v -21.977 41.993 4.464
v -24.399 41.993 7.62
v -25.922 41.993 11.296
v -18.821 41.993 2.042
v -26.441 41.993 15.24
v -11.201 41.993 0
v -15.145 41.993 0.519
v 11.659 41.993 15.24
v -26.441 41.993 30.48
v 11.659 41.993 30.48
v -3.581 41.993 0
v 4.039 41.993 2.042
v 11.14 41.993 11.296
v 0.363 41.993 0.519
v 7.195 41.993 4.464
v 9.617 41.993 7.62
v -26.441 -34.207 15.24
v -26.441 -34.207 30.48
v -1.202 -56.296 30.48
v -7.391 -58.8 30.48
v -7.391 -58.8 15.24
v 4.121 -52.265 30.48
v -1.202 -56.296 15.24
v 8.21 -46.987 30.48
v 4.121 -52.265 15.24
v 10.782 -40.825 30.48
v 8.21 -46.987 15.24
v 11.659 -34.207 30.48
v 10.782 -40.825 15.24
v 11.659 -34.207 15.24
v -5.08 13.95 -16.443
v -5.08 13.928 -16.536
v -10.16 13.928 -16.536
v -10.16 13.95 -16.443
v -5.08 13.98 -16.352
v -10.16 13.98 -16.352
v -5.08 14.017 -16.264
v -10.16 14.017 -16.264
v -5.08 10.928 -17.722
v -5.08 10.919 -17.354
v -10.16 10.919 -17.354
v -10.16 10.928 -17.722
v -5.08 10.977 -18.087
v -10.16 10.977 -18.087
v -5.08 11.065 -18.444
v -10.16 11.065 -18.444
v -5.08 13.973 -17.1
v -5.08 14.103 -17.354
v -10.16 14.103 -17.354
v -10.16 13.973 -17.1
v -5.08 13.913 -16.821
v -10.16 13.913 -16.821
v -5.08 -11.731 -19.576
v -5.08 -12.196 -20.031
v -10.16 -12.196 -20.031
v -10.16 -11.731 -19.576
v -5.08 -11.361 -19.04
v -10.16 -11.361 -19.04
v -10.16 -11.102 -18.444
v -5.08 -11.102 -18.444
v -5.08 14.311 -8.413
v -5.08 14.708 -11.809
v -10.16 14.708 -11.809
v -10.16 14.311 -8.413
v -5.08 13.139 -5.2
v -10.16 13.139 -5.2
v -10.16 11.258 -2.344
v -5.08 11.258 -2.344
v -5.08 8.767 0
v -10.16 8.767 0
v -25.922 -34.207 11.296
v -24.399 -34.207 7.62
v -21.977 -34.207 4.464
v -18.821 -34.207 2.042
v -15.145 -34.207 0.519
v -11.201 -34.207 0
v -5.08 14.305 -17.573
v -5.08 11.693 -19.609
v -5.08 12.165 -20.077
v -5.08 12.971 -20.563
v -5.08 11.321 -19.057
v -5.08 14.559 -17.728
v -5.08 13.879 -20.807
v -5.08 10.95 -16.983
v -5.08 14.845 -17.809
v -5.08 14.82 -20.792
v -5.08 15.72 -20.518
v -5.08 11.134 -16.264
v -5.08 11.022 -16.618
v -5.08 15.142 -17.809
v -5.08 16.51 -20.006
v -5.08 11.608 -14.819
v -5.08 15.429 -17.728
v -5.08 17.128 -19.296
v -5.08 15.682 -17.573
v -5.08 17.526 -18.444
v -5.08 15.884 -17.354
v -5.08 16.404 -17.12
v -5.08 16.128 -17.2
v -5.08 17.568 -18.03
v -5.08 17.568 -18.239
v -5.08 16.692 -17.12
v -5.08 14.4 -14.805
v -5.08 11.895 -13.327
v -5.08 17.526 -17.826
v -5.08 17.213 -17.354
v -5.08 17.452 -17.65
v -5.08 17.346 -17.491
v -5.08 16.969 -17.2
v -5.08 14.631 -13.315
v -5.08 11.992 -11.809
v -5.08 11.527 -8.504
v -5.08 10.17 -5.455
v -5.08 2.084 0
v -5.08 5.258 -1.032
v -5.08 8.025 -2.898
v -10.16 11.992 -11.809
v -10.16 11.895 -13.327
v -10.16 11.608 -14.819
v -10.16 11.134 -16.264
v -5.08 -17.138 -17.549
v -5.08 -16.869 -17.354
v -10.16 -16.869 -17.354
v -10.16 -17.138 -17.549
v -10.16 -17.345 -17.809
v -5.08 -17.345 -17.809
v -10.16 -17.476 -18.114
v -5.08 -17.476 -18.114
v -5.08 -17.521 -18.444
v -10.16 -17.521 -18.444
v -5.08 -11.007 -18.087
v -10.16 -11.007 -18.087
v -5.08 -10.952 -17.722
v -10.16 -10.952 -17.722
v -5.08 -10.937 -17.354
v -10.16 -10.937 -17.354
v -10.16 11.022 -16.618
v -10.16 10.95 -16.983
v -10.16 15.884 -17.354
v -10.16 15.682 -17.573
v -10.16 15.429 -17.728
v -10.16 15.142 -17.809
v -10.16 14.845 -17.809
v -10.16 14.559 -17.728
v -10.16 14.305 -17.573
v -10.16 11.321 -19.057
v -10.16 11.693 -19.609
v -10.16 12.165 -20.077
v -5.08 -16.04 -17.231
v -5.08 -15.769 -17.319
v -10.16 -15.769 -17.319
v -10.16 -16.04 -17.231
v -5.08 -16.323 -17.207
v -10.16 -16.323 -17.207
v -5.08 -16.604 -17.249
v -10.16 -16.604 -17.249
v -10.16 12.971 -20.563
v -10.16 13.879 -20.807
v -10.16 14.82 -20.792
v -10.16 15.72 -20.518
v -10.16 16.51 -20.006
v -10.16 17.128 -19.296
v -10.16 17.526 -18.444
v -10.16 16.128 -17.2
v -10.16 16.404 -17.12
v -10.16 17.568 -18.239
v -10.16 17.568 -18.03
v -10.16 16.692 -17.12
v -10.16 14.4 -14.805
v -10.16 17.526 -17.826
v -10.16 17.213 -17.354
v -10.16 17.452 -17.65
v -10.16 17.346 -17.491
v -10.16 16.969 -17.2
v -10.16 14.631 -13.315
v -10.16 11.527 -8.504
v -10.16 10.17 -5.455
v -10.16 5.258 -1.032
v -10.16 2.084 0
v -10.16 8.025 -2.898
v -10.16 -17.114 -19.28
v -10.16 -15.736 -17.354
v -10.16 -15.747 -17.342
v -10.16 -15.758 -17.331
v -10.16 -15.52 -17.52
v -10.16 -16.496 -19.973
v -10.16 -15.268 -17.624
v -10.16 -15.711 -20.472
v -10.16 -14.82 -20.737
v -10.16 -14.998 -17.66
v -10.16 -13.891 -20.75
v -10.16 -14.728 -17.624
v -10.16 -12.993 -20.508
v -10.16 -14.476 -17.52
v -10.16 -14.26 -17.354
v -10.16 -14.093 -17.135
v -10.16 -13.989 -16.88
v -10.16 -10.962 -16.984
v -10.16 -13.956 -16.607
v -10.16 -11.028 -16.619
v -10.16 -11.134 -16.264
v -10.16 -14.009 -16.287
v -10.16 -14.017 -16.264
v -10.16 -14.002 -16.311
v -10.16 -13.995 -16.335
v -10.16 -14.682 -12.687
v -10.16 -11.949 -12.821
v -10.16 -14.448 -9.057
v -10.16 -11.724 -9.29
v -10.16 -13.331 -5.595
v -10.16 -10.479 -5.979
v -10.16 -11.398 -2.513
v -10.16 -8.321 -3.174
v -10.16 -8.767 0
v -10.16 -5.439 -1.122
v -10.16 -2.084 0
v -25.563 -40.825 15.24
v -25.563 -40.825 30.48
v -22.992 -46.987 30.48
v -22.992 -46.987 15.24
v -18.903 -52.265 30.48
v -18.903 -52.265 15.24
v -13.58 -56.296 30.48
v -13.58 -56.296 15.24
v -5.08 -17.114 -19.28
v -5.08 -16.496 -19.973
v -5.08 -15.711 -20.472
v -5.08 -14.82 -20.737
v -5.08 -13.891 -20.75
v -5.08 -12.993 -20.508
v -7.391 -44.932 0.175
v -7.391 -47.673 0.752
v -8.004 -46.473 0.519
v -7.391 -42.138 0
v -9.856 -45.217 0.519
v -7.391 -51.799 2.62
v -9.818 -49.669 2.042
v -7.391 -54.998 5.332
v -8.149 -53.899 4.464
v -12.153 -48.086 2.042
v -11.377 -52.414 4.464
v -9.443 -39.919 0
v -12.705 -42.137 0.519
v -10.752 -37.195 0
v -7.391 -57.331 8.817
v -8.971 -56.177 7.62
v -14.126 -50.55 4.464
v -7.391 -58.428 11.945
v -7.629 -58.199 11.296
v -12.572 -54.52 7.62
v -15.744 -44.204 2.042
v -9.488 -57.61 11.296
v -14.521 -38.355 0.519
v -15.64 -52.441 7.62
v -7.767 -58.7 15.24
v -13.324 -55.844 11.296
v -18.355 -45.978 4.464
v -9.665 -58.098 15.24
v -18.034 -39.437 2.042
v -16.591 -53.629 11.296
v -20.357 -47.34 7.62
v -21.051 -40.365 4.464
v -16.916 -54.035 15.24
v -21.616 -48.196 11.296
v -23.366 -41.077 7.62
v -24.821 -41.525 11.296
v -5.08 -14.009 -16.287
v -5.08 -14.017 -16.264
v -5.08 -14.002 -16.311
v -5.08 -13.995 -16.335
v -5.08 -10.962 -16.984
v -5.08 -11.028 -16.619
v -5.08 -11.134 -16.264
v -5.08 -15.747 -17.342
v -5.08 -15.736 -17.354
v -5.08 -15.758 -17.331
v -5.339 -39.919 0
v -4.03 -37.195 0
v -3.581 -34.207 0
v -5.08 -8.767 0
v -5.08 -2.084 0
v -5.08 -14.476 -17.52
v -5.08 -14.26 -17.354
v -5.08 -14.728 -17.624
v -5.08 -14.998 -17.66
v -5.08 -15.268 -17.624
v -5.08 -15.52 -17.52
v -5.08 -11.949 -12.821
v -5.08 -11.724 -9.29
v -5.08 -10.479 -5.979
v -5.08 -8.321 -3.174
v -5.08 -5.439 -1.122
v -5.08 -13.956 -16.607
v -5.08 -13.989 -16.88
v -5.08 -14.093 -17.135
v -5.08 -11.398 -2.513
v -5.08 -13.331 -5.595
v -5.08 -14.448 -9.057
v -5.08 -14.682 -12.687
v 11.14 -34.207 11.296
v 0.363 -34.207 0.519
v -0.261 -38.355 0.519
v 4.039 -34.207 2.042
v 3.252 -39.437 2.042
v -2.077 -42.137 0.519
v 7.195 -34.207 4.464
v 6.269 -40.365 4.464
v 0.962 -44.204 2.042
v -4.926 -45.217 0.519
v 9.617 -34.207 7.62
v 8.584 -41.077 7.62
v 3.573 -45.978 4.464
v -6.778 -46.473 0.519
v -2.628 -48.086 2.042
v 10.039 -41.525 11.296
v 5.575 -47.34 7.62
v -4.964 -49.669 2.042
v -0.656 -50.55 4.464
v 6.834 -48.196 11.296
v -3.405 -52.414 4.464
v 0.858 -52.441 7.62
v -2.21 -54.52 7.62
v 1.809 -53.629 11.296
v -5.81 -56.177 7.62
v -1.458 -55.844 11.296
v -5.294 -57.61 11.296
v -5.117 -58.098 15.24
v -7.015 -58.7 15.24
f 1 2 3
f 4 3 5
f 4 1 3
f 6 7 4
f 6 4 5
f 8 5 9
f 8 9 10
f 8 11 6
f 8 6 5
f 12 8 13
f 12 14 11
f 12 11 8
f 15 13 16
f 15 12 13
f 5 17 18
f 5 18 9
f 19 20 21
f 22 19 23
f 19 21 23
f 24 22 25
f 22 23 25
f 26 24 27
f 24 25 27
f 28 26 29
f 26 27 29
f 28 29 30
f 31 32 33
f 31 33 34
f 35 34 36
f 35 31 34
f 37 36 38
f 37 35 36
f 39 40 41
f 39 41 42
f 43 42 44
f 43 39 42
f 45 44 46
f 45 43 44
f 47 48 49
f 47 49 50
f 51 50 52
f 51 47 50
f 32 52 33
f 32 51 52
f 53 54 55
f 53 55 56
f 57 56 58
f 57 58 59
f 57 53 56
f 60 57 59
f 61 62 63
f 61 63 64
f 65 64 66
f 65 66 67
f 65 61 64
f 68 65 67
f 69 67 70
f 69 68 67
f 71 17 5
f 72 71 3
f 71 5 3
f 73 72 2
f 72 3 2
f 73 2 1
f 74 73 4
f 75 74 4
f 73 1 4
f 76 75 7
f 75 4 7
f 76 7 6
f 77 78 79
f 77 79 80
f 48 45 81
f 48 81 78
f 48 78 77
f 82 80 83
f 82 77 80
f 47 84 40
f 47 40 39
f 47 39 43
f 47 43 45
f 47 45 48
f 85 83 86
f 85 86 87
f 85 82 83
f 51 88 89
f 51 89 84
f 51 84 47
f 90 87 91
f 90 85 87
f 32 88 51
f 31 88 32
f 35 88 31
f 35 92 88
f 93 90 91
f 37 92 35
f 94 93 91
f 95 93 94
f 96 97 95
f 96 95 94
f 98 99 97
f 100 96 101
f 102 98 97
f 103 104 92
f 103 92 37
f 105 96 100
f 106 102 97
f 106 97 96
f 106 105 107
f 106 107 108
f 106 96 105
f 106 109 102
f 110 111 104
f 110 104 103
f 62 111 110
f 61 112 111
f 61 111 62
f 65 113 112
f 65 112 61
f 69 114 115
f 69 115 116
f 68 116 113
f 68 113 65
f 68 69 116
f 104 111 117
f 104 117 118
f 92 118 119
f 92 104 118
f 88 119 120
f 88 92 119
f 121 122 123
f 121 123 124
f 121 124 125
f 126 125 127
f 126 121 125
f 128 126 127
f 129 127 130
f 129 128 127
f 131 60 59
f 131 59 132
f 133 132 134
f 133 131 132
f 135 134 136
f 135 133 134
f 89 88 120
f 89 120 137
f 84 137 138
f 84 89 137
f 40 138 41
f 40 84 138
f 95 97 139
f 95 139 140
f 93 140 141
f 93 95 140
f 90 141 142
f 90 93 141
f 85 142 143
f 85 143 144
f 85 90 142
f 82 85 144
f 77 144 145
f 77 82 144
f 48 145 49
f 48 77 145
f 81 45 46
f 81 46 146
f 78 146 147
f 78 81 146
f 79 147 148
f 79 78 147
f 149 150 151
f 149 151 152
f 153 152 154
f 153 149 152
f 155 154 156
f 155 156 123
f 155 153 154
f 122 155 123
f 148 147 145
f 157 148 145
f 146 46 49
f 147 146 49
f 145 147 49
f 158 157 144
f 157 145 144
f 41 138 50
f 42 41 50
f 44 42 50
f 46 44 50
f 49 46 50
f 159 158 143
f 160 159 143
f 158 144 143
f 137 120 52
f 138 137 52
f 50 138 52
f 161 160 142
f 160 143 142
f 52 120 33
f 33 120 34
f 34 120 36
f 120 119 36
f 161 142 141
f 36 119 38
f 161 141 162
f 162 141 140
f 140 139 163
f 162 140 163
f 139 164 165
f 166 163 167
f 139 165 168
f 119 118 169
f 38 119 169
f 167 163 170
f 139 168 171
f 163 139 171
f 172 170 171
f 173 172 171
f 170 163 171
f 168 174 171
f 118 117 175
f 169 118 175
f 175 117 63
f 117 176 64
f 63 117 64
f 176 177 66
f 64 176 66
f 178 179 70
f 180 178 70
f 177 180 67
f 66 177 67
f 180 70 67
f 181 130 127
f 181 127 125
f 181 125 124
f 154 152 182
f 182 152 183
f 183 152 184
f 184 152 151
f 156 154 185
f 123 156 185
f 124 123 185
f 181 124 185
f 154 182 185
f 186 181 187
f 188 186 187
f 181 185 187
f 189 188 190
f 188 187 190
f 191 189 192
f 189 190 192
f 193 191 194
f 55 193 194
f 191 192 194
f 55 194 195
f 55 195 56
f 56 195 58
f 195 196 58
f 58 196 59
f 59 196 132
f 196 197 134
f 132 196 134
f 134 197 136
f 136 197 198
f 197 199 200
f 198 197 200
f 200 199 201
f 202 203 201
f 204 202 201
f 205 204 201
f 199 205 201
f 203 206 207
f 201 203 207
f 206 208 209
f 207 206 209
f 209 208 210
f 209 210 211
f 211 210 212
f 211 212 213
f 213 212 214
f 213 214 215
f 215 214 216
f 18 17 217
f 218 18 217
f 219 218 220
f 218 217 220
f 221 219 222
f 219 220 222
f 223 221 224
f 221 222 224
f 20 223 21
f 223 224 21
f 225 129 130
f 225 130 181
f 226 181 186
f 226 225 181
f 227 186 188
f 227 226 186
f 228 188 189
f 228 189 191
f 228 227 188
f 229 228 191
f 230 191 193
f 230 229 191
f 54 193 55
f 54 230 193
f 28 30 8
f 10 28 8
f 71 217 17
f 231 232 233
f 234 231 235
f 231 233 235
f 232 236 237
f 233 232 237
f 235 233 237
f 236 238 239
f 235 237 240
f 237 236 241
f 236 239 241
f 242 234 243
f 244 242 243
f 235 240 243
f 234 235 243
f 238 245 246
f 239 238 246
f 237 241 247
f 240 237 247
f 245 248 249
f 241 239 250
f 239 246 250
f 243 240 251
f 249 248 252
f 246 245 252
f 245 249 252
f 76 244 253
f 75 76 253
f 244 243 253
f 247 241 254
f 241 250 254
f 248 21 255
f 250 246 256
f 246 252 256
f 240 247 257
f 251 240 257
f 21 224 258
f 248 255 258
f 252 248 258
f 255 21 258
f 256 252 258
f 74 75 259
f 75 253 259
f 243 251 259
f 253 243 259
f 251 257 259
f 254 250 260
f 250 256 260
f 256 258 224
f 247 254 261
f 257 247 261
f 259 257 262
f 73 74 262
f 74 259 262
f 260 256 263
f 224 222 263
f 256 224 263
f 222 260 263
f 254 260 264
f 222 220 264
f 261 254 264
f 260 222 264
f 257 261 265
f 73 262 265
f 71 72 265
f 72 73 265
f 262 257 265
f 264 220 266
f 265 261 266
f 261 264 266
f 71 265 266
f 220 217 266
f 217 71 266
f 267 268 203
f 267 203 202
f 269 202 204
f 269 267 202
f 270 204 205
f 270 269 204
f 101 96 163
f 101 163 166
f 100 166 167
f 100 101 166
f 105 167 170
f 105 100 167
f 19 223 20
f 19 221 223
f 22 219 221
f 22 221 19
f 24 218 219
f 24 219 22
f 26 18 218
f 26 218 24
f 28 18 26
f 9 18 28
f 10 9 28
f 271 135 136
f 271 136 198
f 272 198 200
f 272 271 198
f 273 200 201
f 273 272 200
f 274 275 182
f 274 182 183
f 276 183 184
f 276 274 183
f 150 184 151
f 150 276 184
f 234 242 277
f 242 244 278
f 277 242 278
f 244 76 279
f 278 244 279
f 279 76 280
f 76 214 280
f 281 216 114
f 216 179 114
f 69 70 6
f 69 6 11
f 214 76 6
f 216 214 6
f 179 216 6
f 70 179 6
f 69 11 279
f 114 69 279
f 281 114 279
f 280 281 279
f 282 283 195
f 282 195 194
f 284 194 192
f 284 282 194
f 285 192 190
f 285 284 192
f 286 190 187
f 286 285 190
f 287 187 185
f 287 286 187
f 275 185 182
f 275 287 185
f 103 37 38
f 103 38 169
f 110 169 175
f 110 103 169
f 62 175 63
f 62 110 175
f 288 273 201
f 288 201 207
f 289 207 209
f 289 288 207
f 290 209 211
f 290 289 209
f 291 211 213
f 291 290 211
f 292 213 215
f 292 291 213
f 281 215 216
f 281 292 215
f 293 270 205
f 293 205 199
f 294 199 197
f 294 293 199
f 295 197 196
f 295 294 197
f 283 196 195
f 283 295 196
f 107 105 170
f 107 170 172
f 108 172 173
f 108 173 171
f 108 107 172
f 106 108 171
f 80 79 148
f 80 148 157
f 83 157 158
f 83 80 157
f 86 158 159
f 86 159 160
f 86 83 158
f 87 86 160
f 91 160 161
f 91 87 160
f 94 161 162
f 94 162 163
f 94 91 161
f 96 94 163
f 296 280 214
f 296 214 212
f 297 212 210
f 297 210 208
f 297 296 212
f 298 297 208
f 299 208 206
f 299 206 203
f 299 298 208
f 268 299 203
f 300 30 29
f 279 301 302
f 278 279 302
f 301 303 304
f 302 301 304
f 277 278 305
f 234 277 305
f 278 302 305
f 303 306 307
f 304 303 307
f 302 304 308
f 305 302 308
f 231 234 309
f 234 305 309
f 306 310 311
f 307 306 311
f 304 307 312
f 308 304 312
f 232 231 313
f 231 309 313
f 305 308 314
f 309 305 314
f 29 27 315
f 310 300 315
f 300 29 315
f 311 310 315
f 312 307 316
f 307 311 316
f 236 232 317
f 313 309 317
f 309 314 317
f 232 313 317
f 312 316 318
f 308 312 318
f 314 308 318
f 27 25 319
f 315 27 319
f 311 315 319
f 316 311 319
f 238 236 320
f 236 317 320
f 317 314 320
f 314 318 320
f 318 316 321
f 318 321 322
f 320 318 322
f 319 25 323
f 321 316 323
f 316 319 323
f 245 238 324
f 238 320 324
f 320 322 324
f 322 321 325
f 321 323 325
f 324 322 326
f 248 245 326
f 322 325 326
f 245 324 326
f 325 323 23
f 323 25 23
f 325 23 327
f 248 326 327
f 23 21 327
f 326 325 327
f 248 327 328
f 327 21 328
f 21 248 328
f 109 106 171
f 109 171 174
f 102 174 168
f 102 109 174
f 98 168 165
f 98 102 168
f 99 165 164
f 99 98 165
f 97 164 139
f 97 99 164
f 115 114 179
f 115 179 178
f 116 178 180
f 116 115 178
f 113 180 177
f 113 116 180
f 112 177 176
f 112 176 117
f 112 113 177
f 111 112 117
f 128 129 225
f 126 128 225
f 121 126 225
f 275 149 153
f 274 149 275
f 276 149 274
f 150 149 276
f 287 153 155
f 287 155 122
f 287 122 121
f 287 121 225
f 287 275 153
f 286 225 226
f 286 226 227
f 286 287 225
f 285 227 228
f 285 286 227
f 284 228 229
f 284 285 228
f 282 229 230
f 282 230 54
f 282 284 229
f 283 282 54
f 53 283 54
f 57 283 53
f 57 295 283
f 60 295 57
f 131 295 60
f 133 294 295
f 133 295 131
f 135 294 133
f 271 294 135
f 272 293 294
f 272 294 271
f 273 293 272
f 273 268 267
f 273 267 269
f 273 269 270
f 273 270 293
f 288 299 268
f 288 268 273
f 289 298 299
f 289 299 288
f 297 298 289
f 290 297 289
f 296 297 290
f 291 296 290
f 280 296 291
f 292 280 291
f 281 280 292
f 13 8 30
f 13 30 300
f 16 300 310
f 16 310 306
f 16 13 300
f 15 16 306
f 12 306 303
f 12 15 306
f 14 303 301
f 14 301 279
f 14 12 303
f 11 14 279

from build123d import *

# Parameters (mm, degrees)
F0_W        = 38.1
F0_H        = 101.6
F1_DEPTH    = 30.48
F2_T1_DEPTH = 157.48
F5_DEPTH    = 5.08
F6_T1_DEPTH = 114.3
F6_T4_ANGLE = 161.4904654603
F6_T6_ANGLE = 161.4904654612


# Not quite as in the source:
# - a fillet or chamfer that OpenCascade refuses, or shapes differently, is made with other operations: its cross-section is extruded or revolved along the edge and cut away or added


with BuildPart() as f1:
    # F0 (on Top) → F1 (new body)
    with BuildSketch(Plane.XY):
        with Locations((-7.3909840986, -8.8067197621)):
            Rectangle(F0_W, F0_H)
    extrude(amount=F1_DEPTH)

    # F2: fillet of radius 25.4 on 2 edges, made by hand

    # F2_s2 → F2_t1 (cut)
    with BuildSketch(Plane.XY.offset(-63.5)):
        with BuildLine():
            ThreePointArc((-13.7409840986, -59.6067197621), (4.2195281435, -52.1672320042), (11.6590159014, -34.2067197621))
            Line((11.6590159014, -34.2067197621), (11.6590159014, -59.6067197621))
            Line((11.6590159014, -59.6067197621), (-13.7409840986, -59.6067197621))
        make_face()
        with BuildLine():
            ThreePointArc((-26.4409840986, -34.2067197621), (-19.0014963408, -52.1672320042), (-1.0409840986, -59.6067197621))
            Line((-1.0409840986, -59.6067197621), (-26.4409840986, -59.6067197621))
            Line((-26.4409840986, -59.6067197621), (-26.4409840986, -34.2067197621))
        make_face()
    extrude(amount=F2_T1_DEPTH, mode=Mode.SUBTRACT)

    # F4 (on offset) → F5 (join)
    with BuildSketch(Plane.YZ.offset(-5.08)):
        with BuildLine():
            Line((-14.0174488836, -16.263814643), (-11.133858472, -16.263814643))
            ThreePointArc((-11.133858472, -16.263814643), (-2.2681486848, -0.0339935381), (11.991857098, -11.8093974888))
            ThreePointArc((11.991857098, -11.8093974888), (11.7754039507, -14.0775461736), (11.133858472, -16.263814643))
            Line((11.133858472, -16.263814643), (14.0174488836, -16.263814643))
            ThreePointArc((14.0174488836, -16.263814643), (14.5344751626, -14.0632247081), (14.7081849794, -11.8093974888))
            ThreePointArc((14.7081849794, -11.8093974888), (-2.2538272193, 2.7250776738), (-14.0174488836, -16.263814643))
        make_face()
        with BuildLine():
            ThreePointArc((-10.936740827, -17.3538234085), (-10.9902716166, -16.8006761373), (-11.133858472, -16.263814643))
            Line((-11.133858472, -16.263814643), (-14.0174488836, -16.263814643))
            ThreePointArc((-14.0174488836, -16.263814643), (-14.0054514358, -16.2990621553), (-13.9947204643, -16.3347156561))
            ThreePointArc((-13.9947204643, -16.3347156561), (-13.8183302749, -16.8476961899), (-13.6231437858, -17.3538234085))
            Line((-13.6231437858, -17.3538234085), (-10.936740827, -17.3538234085))
        make_face()
        with BuildLine():
            Line((14.0174488836, -16.263814643), (11.133858472, -16.263814643))
            ThreePointArc((11.133858472, -16.263814643), (10.9810910084, -16.799907635), (10.9185537399, -17.3538234085))
            Line((10.9185537399, -17.3538234085), (13.6231437858, -17.3538234085))
            ThreePointArc((13.6231437858, -17.3538234085), (13.781697315, -16.9470549808), (13.9281083774, -16.5357599818))
            ThreePointArc((13.9281083774, -16.5357599818), (13.9637636905, -16.3968256904), (14.0174488836, -16.263814643))
        make_face()
        with BuildLine():
            ThreePointArc((-11.1015096713, -18.4438321739), (-10.9743154761, -17.9056013647), (-10.936740827, -17.3538234085))
            Line((-10.936740827, -17.3538234085), (-13.6231437858, -17.3538234085))
            ThreePointArc((-13.6231437858, -17.3538234085), (-13.3861112566, -17.9038811268), (-13.1268801243, -18.4438321739))
            Line((-13.1268801243, -18.4438321739), (-11.1015096713, -18.4438321739))
        make_face()
        with BuildLine():
            Line((13.6231437858, -17.3538234085), (10.9185537399, -17.3538234085))
            ThreePointArc((10.9185537399, -17.3538234085), (10.9471844464, -17.9048318245), (11.0651192382, -18.4438321739))
            Line((11.0651192382, -18.4438321739), (13.1268801243, -18.4438321739))
            ThreePointArc((13.1268801243, -18.4438321739), (13.3861112566, -17.9038811268), (13.6231437858, -17.3538234085))
        make_face()
        with BuildLine():
            ThreePointArc((-13.6231437858, -17.3538234085), (-13.8183302749, -16.8476961899), (-13.9947204643, -16.3347156561))
            ThreePointArc((-13.9947204643, -16.3347156561), (-13.9894299583, -16.8803028031), (-14.2604863377, -17.3538234085))
            Line((-14.2604863377, -17.3538234085), (-13.6231437858, -17.3538234085))
        make_face()
        with BuildLine():
            ThreePointArc((-13.1268801243, -18.4438321739), (-13.3861112566, -17.9038811268), (-13.6231437858, -17.3538234085))
            Line((-13.6231437858, -17.3538234085), (-14.2604863377, -17.3538234085))
            ThreePointArc((-14.2604863377, -17.3538234085), (-14.9980791155, -17.659647367), (-15.7356718933, -17.3538234085))
            Line((-15.7356718933, -17.3538234085), (-16.868545512, -17.3538234085))
            ThreePointArc((-16.868545512, -17.3538234085), (-17.3451536393, -17.8087510018), (-17.5206139684, -18.4438321739))
            Line((-17.5206139684, -18.4438321739), (-13.1268801243, -18.4438321739))
        make_face()
        with BuildLine():
            ThreePointArc((-12.195911288, -20.0307388176), (-11.5329900367, -19.3170914758), (-11.1015096713, -18.4438321739))
            Line((-11.1015096713, -18.4438321739), (-13.1268801243, -18.4438321739))
            ThreePointArc((-13.1268801243, -18.4438321739), (-12.6862330658, -19.2518564902), (-12.195911288, -20.0307388176))
        make_face()
        with BuildLine():
            ThreePointArc((14.1034464611, -17.3538234085), (13.9336822531, -16.962387408), (13.9281083774, -16.5357599818))
            ThreePointArc((13.9281083774, -16.5357599818), (13.781697315, -16.9470549808), (13.6231437858, -17.3538234085))
            Line((13.6231437858, -17.3538234085), (14.1034464611, -17.3538234085))
        make_face()
        with BuildLine():
            Line((14.1034464611, -17.3538234085), (13.6231437858, -17.3538234085))
            ThreePointArc((13.6231437858, -17.3538234085), (13.3861112566, -17.9038811268), (13.1268801243, -18.4438321739))
            Line((13.1268801243, -18.4438321739), (17.526, -18.4438321739))
            Line((17.526, -18.4438321739), (17.526, -17.8258201323))
            ThreePointArc((17.526, -17.8258201323), (17.4025849977, -17.5677526977), (17.2126789083, -17.3538234085))
            Line((17.2126789083, -17.3538234085), (15.8839765936, -17.3538234085))
            ThreePointArc((15.8839765936, -17.3538234085), (14.9937115274, -17.8192920932), (14.1034464611, -17.3538234085))
        make_face()
        with BuildLine():
            Line((13.1268801243, -18.4438321739), (11.0651192382, -18.4438321739))
            ThreePointArc((11.0651192382, -18.4438321739), (11.4934563351, -19.3420700335), (12.1649032036, -20.0765514995))
            ThreePointArc((12.1649032036, -20.0765514995), (12.6722144503, -19.2757008789), (13.1268801243, -18.4438321739))
        make_face()
        with BuildLine():
            ThreePointArc((-12.195911288, -20.0307388176), (-12.6862330658, -19.2518564902), (-13.1268801243, -18.4438321739))
            Line((-13.1268801243, -18.4438321739), (-17.5206139684, -18.4438321739))
            ThreePointArc((-17.5206139684, -18.4438321739), (-15.2749066717, -20.6352919031), (-12.195911288, -20.0307388176))
        make_face()
        with BuildLine():
            Line((17.526, -18.4438321739), (13.1268801243, -18.4438321739))
            ThreePointArc((13.1268801243, -18.4438321739), (12.6722144503, -19.2757008789), (12.1649032036, -20.0765514995))
            ThreePointArc((12.1649032036, -20.0765514995), (15.2798483428, -20.6865502684), (17.526, -18.4438321739))
        make_face()
        with BuildLine():
            Line((-16.868545512, -17.3538234085), (-15.7356718933, -17.3538234085))
            ThreePointArc((-15.7356718933, -17.3538234085), (-15.7525545617, -17.3365203222), (-15.769031426, -17.3188303749))
            ThreePointArc((-15.769031426, -17.3188303749), (-16.3228921506, -17.2073853467), (-16.868545512, -17.3538234085))
        make_face()
        with BuildLine():
            ThreePointArc((17.2126789083, -17.3538234085), (16.548327751, -17.1094834068), (15.8839765936, -17.3538234085))
            Line((15.8839765936, -17.3538234085), (17.2126789083, -17.3538234085))
        make_face()
        with BuildLine():
            ThreePointArc((17.526, -18.4438321739), (17.5736704973, -18.1348261531), (17.526, -17.8258201323))
            Line((17.526, -17.8258201323), (17.526, -18.4438321739))
        make_face()
    extrude(amount=-F5_DEPTH)

    # F6: fillet of radius 15.24 on 4 edges, made by hand

    # F6_s2 → F6_t1 (cut)
    with BuildSketch(Plane.XZ.offset(-80.0932802379)):
        with BuildLine():
            ThreePointArc((11.6590159014, 15.24), (7.1953232467, 4.4636926547), (-3.5809840986, 0))
            Line((-3.5809840986, 0), (11.6590159014, 0))
            Line((11.6590159014, 0), (11.6590159014, 15.24))
        make_face()
        with BuildLine():
            ThreePointArc((-26.4409840986, 15.24), (-21.9772914439, 4.4636926547), (-11.2009840986, 0))
            Line((-11.2009840986, 0), (-26.4409840986, 0))
            Line((-26.4409840986, 0), (-26.4409840986, 15.24))
        make_face()
    extrude(amount=F6_T1_DEPTH, mode=Mode.SUBTRACT)

    # F6_s3 → F6_t4 (revolve, cut)
    with BuildSketch(Plane.XZ.offset(34.206719762)):
        with BuildLine():
            ThreePointArc((-3.5809840986, 0), (7.1953232467, 4.4636926547), (11.6590159014, 15.24))
            Line((11.6590159014, 15.24), (11.6590159014, 0))
            Line((11.6590159014, 0), (-3.5809840986, 0))
        make_face()
    revolve(axis=Axis((-13.7409840987, -34.206719762, 0), (0, 0, -1)), revolution_arc=F6_T4_ANGLE, mode=Mode.SUBTRACT)

    # F6_s5 → F6_t6 (revolve, cut)
    with BuildSketch(Plane(origin=(-10.402517324, -31.0726622139, 0), x_dir=(0, 0, 1), z_dir=(0.3174624617, 0.9482708397, 0))):
        with BuildLine():
            ThreePointArc((0, 20.0322145968), (4.4636926547, 30.8085219421), (15.24, 35.2722145968))
            Line((15.24, 35.2722145968), (0, 35.2722145968))
            Line((0, 35.2722145968), (0, 20.0322145968))
        make_face()
    revolve(axis=Axis((-1.0409840986, -34.2067197621, 0), (0, 0, -1)), revolution_arc=F6_T6_ANGLE, mode=Mode.SUBTRACT)


solid = f1.part
